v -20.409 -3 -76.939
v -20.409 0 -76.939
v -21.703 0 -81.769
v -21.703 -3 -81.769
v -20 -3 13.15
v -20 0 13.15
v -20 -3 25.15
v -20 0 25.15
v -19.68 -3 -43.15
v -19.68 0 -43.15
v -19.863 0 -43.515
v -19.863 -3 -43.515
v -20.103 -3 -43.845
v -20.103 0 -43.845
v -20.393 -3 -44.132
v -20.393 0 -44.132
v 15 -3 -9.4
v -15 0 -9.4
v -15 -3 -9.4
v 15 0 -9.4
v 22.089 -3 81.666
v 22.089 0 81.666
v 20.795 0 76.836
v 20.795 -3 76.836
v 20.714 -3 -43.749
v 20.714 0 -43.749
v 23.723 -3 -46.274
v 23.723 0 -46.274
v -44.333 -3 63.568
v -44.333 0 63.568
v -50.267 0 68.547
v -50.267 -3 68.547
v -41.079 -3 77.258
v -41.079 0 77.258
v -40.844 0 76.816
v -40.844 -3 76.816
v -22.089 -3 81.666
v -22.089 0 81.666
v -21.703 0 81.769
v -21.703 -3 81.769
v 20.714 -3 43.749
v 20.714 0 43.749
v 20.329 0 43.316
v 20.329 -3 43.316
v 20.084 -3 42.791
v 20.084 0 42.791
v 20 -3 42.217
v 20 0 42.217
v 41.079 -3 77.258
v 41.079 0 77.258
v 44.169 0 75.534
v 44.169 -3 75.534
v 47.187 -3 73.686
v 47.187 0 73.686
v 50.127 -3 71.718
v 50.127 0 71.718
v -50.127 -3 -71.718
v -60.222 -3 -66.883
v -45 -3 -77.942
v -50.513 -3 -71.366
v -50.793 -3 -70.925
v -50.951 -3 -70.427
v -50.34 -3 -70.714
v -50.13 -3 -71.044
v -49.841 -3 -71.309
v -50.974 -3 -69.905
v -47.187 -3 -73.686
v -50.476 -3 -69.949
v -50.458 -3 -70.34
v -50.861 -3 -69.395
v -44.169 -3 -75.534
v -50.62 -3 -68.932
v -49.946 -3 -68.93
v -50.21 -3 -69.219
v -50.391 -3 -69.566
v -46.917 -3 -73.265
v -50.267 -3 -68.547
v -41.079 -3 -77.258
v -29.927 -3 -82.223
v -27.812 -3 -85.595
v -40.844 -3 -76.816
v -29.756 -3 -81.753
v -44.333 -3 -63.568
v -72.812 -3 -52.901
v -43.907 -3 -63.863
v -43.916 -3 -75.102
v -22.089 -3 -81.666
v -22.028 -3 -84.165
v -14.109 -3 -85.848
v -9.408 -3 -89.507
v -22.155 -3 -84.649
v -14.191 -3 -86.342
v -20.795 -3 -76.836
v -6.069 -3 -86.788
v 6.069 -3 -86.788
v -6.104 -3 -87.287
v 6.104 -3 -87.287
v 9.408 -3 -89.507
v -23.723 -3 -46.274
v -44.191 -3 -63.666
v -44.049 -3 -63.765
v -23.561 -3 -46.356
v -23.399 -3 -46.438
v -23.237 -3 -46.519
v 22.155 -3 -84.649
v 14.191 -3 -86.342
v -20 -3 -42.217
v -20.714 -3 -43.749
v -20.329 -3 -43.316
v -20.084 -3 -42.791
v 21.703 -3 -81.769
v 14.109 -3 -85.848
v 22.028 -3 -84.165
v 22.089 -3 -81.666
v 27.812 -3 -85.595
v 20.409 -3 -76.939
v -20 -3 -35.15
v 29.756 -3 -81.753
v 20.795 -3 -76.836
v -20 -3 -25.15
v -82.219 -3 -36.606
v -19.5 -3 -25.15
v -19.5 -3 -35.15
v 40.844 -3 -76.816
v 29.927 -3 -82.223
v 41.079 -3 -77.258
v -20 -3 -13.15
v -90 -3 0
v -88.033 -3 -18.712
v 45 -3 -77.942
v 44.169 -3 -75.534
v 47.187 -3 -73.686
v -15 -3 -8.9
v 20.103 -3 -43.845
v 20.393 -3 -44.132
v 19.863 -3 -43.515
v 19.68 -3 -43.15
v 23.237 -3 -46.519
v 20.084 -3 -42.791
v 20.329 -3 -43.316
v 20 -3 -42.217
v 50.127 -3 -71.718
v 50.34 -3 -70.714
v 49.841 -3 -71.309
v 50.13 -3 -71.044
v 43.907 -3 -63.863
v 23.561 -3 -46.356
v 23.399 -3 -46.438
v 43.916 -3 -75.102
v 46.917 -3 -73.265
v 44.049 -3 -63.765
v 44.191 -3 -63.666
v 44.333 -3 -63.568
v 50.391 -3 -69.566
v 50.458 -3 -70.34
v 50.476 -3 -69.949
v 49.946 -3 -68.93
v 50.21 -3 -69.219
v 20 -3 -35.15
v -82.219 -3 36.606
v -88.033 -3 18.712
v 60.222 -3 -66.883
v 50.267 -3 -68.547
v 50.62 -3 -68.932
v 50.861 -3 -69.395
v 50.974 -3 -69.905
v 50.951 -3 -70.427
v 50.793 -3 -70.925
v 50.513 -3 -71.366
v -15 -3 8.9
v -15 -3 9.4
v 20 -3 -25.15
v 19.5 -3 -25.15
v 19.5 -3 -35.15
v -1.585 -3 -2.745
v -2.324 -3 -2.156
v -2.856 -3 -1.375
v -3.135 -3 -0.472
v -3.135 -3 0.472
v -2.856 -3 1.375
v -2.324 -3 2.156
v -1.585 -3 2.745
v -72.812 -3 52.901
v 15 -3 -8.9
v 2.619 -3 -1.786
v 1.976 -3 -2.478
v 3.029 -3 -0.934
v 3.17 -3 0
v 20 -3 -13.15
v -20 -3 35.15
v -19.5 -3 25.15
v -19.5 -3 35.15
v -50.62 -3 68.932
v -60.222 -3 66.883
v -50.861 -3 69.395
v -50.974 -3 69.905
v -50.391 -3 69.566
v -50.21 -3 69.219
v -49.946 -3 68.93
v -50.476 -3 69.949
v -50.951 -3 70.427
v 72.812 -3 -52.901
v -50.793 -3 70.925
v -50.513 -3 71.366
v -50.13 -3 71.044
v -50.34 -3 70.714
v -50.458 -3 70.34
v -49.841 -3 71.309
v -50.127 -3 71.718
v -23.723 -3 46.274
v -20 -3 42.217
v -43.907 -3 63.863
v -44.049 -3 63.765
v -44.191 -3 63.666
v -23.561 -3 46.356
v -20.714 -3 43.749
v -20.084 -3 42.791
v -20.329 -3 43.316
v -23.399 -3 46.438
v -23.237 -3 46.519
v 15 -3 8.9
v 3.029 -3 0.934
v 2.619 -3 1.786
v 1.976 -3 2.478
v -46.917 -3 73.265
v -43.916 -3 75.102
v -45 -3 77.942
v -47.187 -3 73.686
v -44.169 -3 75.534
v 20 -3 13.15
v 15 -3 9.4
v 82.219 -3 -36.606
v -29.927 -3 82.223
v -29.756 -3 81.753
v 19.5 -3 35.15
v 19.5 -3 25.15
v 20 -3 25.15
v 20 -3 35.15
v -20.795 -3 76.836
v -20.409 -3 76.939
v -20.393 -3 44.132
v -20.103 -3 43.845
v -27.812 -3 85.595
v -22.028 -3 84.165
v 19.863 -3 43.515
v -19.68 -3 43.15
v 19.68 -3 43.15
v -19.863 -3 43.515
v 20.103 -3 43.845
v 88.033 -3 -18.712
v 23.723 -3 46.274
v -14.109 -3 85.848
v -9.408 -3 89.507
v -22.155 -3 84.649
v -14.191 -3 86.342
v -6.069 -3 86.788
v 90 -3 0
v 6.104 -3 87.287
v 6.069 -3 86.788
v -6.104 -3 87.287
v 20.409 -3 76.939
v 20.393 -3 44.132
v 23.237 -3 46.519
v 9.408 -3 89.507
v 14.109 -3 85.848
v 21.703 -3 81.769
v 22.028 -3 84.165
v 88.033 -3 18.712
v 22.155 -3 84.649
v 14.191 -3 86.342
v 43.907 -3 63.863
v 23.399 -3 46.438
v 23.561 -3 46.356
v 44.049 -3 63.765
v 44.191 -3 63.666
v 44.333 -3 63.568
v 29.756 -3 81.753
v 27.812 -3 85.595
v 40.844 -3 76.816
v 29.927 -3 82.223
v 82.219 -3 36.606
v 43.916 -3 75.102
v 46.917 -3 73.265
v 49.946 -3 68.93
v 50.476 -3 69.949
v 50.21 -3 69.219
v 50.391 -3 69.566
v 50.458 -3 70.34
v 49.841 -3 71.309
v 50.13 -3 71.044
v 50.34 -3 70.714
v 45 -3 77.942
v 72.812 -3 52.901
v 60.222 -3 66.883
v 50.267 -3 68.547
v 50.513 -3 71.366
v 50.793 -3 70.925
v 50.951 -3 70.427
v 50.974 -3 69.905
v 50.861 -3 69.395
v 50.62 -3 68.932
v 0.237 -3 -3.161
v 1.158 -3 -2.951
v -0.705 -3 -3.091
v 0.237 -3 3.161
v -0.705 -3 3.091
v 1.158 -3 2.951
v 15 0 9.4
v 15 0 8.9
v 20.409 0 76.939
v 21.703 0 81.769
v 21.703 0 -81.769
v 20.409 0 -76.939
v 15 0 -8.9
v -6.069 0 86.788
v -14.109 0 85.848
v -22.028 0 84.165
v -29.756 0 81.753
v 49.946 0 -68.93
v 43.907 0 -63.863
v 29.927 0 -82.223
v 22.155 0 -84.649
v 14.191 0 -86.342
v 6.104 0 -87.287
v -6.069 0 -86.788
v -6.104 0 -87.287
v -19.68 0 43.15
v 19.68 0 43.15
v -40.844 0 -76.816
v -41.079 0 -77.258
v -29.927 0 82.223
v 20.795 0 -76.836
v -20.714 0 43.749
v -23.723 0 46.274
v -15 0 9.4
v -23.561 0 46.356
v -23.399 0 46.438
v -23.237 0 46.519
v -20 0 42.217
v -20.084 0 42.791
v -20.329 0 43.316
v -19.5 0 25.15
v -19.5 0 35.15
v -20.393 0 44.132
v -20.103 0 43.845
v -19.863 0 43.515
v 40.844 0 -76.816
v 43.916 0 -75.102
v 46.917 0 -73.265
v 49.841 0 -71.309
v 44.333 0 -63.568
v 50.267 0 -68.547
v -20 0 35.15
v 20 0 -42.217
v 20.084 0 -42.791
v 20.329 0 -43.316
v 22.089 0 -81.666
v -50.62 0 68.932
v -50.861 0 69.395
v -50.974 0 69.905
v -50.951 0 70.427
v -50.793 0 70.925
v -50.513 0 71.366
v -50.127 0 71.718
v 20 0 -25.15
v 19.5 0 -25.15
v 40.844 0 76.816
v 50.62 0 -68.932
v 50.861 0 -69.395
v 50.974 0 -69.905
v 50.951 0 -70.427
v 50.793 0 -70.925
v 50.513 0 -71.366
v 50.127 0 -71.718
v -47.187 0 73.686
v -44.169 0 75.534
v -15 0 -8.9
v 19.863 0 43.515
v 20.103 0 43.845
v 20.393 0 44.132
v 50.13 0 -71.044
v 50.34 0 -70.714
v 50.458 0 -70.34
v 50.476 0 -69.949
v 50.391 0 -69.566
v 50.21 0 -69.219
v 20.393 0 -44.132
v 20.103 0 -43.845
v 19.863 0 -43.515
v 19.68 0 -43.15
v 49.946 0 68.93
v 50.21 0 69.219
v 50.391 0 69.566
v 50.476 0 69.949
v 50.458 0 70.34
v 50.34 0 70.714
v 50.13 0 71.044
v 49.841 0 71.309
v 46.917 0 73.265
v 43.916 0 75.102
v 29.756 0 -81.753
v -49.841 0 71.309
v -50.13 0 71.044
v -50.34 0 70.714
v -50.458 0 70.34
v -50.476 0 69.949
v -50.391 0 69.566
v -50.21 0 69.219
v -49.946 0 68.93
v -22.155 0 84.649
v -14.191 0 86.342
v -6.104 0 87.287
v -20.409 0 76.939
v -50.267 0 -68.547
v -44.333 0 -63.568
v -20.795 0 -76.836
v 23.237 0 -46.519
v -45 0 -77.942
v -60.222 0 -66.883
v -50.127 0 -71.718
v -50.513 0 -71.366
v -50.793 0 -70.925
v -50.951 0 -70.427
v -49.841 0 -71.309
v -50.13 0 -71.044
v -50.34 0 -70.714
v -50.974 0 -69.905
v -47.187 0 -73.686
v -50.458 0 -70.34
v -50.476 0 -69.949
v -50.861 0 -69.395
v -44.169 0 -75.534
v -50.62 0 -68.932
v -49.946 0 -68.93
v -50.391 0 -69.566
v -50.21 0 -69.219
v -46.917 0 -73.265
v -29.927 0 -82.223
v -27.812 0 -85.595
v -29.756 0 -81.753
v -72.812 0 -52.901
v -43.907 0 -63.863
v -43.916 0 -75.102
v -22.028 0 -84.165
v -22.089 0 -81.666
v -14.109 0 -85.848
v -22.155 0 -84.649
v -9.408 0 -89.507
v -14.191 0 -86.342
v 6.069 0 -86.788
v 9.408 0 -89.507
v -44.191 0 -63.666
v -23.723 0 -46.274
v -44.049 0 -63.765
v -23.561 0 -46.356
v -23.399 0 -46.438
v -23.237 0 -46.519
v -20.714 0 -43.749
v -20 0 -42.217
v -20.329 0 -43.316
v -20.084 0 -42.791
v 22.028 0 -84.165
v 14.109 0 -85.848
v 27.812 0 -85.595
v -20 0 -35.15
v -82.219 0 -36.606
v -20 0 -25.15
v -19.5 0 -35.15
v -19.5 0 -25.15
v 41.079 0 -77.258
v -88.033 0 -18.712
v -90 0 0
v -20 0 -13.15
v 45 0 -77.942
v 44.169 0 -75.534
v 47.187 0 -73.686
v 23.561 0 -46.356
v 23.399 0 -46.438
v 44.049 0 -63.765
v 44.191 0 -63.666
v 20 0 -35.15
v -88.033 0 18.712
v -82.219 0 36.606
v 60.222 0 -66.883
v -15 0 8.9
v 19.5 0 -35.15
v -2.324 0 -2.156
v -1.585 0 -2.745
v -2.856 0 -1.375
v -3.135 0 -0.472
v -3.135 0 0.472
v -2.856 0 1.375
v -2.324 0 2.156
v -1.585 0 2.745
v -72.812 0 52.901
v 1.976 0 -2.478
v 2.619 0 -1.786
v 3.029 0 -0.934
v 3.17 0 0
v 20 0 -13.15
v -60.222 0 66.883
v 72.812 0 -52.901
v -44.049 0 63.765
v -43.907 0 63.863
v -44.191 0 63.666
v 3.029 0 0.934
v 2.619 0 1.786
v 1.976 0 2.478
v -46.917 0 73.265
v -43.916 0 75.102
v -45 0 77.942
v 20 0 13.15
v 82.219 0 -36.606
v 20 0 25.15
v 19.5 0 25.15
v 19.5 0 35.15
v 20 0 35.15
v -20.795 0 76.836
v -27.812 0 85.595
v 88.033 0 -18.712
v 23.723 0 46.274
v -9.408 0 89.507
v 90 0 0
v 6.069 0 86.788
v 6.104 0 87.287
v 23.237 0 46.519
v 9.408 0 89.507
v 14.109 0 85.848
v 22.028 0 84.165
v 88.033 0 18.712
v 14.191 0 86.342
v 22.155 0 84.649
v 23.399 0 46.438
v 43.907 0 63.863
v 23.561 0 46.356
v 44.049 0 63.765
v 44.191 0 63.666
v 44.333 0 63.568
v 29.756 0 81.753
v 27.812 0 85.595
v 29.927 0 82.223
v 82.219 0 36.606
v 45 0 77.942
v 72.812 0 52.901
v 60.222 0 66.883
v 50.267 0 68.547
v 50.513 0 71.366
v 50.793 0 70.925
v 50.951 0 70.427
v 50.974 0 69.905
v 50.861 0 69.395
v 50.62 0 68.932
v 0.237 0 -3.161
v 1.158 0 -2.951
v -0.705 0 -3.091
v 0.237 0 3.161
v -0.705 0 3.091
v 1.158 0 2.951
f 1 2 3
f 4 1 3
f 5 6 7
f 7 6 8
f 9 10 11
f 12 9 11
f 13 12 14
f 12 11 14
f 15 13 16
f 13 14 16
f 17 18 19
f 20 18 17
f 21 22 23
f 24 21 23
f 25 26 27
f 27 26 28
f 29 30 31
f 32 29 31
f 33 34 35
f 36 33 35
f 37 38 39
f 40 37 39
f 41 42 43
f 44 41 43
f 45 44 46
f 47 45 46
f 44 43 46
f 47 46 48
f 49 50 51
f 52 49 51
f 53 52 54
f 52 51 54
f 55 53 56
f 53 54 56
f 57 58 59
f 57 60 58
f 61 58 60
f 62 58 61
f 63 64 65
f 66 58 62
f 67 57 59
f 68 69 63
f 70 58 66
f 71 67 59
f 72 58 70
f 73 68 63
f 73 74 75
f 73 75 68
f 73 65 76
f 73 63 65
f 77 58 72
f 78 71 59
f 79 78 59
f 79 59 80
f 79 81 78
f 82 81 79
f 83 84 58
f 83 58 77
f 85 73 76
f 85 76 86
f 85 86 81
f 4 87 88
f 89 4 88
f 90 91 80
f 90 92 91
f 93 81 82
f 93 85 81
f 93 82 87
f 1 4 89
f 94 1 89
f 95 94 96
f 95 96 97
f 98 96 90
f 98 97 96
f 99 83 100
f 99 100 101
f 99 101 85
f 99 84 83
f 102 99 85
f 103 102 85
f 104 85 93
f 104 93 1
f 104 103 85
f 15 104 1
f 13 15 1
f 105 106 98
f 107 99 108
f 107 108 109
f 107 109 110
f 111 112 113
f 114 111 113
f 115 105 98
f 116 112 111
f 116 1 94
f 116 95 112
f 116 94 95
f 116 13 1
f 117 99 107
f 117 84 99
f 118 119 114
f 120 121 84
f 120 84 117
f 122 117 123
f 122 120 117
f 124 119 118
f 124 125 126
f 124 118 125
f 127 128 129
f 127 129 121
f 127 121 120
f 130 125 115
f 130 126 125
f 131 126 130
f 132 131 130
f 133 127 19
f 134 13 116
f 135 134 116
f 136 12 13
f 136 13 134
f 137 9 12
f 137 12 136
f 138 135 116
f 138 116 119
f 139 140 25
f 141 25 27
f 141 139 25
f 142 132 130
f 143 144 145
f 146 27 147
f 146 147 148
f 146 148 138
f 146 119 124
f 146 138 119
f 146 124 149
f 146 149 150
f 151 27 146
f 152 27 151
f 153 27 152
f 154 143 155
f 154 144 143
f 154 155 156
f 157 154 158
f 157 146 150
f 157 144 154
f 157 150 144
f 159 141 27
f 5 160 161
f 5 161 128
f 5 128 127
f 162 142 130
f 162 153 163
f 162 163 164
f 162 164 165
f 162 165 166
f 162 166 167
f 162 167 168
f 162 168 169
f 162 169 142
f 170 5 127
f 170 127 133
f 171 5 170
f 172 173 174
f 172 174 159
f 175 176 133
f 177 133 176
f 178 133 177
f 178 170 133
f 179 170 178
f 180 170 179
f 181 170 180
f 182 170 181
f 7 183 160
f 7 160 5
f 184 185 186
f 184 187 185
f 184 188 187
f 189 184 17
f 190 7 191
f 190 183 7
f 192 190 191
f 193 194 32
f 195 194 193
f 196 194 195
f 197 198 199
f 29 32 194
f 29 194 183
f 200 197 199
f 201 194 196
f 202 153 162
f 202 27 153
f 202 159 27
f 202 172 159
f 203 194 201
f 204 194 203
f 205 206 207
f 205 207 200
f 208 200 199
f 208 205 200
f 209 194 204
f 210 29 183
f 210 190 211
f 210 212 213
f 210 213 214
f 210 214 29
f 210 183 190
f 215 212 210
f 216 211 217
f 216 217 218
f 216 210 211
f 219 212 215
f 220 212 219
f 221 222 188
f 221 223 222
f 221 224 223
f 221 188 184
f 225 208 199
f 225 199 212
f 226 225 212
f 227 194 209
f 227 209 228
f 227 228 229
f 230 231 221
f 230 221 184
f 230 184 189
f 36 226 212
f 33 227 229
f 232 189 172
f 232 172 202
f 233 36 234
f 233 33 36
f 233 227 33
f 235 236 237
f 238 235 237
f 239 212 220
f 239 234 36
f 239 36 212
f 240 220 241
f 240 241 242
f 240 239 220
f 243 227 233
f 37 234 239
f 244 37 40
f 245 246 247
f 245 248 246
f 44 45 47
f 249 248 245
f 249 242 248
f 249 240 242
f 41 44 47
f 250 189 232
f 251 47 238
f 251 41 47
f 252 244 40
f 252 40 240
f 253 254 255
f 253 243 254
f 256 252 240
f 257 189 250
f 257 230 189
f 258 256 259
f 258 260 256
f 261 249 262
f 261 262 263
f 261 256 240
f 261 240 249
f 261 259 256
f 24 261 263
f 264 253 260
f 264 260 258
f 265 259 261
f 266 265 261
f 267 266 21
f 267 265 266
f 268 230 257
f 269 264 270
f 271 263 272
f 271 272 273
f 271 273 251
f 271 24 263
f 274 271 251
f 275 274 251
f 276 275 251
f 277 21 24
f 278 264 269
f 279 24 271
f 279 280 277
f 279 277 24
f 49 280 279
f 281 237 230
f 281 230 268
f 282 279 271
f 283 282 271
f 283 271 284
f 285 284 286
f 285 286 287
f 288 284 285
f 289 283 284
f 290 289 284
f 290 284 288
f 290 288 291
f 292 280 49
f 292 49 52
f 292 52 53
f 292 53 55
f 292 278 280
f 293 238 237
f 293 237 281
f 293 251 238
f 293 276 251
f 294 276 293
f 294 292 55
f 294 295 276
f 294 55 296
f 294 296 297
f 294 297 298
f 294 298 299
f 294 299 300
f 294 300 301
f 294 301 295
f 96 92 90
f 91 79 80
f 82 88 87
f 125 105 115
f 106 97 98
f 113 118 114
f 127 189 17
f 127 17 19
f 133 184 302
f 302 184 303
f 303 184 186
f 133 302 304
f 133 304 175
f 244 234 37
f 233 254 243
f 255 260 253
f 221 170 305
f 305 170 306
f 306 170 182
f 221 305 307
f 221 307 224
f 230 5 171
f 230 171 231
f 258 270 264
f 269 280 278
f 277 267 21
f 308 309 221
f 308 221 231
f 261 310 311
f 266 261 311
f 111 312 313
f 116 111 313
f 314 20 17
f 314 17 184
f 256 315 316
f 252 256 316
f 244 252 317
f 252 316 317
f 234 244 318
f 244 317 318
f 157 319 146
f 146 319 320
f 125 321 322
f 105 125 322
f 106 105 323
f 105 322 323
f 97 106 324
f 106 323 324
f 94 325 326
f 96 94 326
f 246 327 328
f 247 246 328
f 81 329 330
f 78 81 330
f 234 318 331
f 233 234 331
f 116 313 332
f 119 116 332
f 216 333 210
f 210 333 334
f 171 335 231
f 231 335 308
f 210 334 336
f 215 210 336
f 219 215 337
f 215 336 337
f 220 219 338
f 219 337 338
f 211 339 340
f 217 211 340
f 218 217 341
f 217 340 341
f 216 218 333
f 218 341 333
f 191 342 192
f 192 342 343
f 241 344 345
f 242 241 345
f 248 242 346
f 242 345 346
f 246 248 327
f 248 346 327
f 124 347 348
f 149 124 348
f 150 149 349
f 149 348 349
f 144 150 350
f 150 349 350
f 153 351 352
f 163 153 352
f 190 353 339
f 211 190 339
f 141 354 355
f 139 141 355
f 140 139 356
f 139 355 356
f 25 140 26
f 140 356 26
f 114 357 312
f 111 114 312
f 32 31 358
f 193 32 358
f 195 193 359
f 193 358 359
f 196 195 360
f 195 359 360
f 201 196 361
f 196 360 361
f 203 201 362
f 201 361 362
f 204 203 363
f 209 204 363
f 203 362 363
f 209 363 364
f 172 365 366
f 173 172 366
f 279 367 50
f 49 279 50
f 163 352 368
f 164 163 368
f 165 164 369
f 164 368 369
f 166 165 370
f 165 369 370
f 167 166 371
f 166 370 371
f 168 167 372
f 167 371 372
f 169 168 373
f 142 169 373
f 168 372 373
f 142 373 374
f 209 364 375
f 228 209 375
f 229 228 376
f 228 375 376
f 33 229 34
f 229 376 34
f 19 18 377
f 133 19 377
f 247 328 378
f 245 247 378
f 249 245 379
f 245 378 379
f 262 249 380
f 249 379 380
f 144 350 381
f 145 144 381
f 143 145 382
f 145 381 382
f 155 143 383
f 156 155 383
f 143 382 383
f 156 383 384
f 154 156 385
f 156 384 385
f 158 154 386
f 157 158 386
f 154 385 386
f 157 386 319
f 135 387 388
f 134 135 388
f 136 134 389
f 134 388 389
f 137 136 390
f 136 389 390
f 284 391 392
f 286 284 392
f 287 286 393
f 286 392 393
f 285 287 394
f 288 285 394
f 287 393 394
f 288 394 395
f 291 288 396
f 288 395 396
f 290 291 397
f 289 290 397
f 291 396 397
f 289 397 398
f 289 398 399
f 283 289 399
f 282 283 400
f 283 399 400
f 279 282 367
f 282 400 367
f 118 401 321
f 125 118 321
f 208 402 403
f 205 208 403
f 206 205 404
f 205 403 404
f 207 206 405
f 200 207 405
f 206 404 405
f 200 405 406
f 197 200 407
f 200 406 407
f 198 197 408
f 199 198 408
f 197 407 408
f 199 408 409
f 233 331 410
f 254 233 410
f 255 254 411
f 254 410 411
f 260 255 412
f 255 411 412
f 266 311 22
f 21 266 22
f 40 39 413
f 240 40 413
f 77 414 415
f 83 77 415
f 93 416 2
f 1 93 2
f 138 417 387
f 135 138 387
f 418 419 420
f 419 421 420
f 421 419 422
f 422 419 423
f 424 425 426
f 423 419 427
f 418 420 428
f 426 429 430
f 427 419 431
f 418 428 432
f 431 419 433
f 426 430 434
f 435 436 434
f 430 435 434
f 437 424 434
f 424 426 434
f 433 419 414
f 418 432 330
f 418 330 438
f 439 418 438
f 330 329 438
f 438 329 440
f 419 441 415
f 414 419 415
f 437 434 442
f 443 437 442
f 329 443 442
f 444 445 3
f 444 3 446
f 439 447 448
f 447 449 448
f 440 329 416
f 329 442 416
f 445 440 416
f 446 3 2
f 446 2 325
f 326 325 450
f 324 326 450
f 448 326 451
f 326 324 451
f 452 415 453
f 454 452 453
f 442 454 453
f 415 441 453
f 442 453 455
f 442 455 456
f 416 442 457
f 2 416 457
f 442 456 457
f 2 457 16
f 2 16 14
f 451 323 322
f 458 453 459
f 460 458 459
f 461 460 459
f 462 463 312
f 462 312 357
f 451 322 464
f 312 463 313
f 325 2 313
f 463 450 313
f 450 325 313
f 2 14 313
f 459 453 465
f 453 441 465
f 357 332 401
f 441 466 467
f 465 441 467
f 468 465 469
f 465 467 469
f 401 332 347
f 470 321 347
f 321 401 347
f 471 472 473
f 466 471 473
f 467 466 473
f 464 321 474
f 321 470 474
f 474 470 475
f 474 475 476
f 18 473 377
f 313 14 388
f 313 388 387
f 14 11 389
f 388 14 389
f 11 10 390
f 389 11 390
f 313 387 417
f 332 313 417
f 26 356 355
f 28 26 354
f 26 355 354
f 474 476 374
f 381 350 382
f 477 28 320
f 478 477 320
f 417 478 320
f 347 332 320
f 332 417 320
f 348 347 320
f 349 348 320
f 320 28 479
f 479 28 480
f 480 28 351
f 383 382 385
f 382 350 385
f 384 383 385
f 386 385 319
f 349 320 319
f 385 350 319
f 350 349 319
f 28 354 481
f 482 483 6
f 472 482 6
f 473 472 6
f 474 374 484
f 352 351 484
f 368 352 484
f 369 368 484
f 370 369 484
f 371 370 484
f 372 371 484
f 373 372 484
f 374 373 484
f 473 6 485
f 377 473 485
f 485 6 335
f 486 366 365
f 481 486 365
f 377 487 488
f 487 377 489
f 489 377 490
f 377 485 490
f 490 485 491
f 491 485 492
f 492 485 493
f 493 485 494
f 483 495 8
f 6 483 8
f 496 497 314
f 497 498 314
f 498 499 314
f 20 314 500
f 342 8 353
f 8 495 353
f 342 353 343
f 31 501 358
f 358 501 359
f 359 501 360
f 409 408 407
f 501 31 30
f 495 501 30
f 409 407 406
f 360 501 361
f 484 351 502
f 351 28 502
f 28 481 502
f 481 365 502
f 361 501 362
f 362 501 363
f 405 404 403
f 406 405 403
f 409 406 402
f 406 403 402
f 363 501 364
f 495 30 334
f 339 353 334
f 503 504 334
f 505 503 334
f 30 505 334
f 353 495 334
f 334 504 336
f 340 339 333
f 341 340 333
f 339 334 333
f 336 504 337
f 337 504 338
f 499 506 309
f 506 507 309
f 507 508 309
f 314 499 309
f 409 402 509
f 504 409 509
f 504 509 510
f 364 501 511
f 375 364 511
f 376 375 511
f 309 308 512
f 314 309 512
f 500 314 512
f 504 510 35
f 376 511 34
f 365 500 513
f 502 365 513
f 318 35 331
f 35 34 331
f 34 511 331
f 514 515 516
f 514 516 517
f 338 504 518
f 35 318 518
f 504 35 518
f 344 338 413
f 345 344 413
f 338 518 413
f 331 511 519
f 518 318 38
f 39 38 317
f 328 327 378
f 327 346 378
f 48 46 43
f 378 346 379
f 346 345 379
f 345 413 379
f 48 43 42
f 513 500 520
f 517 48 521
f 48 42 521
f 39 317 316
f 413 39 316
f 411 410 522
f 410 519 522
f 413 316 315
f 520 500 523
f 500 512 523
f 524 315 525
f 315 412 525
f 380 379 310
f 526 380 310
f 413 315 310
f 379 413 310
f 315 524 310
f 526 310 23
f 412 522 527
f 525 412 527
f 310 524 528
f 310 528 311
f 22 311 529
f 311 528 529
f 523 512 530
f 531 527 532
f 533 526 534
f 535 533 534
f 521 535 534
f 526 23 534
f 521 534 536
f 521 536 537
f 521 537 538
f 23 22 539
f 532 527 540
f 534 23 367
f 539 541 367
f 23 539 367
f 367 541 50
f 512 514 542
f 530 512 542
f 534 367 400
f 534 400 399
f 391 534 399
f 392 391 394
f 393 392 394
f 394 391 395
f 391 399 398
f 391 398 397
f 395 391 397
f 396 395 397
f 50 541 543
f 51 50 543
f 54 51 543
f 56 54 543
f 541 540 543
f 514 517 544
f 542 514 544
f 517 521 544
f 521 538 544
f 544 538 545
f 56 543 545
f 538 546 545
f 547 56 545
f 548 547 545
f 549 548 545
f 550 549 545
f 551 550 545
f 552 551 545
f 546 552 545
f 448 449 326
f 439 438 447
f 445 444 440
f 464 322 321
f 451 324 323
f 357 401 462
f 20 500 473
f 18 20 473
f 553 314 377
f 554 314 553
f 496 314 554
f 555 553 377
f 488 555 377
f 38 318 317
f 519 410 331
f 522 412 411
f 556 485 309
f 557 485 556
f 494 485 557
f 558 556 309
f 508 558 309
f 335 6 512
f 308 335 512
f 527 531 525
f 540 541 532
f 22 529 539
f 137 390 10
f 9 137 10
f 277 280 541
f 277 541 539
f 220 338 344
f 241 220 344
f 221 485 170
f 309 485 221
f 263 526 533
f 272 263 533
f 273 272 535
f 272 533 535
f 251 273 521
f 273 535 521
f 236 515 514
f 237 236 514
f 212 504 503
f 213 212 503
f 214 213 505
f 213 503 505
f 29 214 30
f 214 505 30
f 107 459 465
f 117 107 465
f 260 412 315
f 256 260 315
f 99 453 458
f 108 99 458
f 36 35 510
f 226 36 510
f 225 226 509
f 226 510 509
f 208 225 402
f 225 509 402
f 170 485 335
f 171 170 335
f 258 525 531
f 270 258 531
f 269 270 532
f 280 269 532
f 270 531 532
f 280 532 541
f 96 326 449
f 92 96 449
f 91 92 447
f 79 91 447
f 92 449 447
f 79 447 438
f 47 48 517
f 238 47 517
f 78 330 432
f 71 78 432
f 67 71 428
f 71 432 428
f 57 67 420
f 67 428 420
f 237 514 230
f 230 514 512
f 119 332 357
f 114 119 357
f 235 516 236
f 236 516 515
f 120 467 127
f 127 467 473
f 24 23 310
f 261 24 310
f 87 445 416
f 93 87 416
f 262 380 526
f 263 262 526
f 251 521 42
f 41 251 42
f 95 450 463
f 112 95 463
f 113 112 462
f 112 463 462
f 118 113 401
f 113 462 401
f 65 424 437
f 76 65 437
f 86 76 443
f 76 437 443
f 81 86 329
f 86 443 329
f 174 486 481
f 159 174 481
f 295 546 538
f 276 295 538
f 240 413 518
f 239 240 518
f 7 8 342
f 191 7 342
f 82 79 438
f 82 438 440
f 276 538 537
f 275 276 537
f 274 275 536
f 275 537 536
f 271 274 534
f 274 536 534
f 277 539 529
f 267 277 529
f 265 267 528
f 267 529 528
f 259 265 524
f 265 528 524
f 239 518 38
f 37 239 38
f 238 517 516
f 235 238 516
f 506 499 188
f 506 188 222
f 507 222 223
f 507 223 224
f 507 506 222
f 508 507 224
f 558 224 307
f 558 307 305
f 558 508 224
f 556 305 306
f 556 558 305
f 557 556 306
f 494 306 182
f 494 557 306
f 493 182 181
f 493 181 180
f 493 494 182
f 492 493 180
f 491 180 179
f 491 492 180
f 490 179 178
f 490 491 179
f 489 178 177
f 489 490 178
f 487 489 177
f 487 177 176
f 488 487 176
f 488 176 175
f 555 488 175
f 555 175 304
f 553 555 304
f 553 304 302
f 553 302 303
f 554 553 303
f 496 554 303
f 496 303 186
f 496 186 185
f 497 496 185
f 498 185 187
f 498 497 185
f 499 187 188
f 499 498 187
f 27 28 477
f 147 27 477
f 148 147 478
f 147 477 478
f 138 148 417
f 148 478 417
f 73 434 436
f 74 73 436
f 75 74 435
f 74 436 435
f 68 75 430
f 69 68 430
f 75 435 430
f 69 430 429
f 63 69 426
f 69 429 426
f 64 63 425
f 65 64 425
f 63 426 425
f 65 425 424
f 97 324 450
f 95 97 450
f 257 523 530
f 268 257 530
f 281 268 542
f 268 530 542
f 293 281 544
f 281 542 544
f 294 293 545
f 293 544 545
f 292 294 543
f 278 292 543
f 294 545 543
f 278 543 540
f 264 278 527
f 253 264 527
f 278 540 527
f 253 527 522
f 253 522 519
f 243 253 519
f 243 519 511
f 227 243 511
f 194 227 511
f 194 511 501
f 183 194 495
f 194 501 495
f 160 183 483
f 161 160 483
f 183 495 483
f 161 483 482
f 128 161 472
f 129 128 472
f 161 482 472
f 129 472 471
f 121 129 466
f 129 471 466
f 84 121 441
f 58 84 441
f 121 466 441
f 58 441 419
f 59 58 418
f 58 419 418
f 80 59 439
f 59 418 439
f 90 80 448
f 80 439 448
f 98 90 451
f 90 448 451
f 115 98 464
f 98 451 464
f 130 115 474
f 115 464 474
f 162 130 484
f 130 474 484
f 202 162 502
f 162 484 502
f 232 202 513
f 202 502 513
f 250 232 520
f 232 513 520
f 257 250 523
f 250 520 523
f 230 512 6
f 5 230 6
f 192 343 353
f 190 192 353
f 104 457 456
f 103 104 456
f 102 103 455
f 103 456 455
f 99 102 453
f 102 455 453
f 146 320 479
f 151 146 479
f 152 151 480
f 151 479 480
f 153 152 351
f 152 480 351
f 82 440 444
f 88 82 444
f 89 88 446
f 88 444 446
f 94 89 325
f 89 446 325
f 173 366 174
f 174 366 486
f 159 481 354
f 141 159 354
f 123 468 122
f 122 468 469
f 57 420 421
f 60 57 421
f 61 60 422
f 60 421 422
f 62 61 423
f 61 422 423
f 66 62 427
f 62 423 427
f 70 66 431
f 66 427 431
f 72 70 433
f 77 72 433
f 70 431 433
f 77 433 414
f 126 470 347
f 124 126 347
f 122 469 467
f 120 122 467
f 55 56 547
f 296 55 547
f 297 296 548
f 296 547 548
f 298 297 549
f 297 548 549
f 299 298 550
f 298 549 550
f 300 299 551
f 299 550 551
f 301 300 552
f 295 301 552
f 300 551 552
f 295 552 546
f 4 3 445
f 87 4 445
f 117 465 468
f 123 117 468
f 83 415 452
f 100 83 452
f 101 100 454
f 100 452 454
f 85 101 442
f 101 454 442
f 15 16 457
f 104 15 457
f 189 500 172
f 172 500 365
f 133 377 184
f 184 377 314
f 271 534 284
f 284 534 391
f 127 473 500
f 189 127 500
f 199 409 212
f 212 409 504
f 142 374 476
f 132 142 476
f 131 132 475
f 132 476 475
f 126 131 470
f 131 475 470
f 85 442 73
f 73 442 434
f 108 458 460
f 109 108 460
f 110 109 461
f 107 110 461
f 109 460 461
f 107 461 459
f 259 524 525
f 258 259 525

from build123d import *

# Parameters (mm, degrees)
F0_R     = 90
F0_W     = 30
F0_H     = 0.5
F0_R_2   = 3.17
F1_DEPTH = 3


with BuildPart() as f1:
    # F0 (on Front) → F1 (new body)
    with BuildSketch(Plane.XZ):
        Circle(F0_R)
        with BuildLine():
            ThreePointArc((-41.078762, -77.257914), (-45.686982, -74.625396), (-50.127129, -71.718345))
            ThreePointArc((-50.127129, -71.718345), (-50.979425, -70.167154), (-50.266941, -68.546979))
            Line((-50.266941, -68.546979), (-44.332839, -63.567676))
            ThreePointArc((-44.332839, -63.567676), (-44.12, -63.715584), (-43.906667, -63.862779))
            Line((-43.906667, -63.862779), (-49.945547, -68.930001))
            ThreePointArc((-49.945547, -68.930001), (-50.47991, -70.145133), (-49.840688, -71.308525))
            ThreePointArc((-49.840688, -71.308525), (-45.425914, -74.198965), (-40.844026, -76.816441))
            Line((-40.844026, -76.816441), (-41.078762, -77.257914))
        make_face(mode=Mode.SUBTRACT)
        with BuildLine():
            Line((-29.926763, -82.223104), (-29.755752, -81.753258))
            ThreePointArc((-29.755752, -81.753258), (-18.088317, -85.098841), (-6.068813, -86.788072))
            Line((-6.068813, -86.788072), (-6.103691, -87.286854))
            ThreePointArc((-6.103691, -87.286854), (-18.192273, -85.587915), (-29.926763, -82.223104))
        make_face(mode=Mode.SUBTRACT)
        Polygon((-20.795181, -76.835932), (-20.408811, -76.93946), (-21.702906, -81.769089), (-22.089276, -81.665561), align=None, mode=Mode.SUBTRACT)
        with BuildLine():
            Line((6.103691, -87.286854), (6.068813, -86.788072))
            ThreePointArc((6.068813, -86.788072), (18.088317, -85.098841), (29.755752, -81.753258))
            Line((29.755752, -81.753258), (29.926763, -82.223104))
            ThreePointArc((29.926763, -82.223104), (18.192273, -85.587915), (6.103691, -87.286854))
        make_face(mode=Mode.SUBTRACT)
        Polygon((22.089276, -81.665561), (21.702906, -81.769089), (20.408811, -76.93946), (20.795181, -76.835932), align=None, mode=Mode.SUBTRACT)
        with BuildLine():
            ThreePointArc((50.266941, -68.546979), (50.979425, -70.167154), (50.127129, -71.718345))
            ThreePointArc((50.127129, -71.718345), (45.686982, -74.625396), (41.078762, -77.257914))
            Line((41.078762, -77.257914), (40.844026, -76.816441))
            ThreePointArc((40.844026, -76.816441), (45.425914, -74.198965), (49.840688, -71.308525))
            ThreePointArc((49.840688, -71.308525), (50.47991, -70.145133), (49.945547, -68.930001))
            Line((49.945547, -68.930001), (43.906667, -63.862779))
            ThreePointArc((43.906667, -63.862779), (44.12, -63.715584), (44.332839, -63.567676))
            Line((44.332839, -63.567676), (50.266941, -68.546979))
        make_face(mode=Mode.SUBTRACT)
        with BuildLine():
            Line((-23.722514, -46.27356), (-20.714425, -43.749474))
            ThreePointArc((-20.714425, -43.749474), (-20.187384, -43.062621), (-20, -42.217385))
            Line((-20, -42.217385), (-20, -35.15))
            Line((-20, -35.15), (-19.5, -35.15))
            Line((-19.5, -35.15), (-19.5, -25.15))
            Line((-19.5, -25.15), (-20, -25.15))
            Line((-20, -25.15), (-20, -15.15))
            Line((-20, -15.15), (-20, -13.15))
            Line((-20, -13.15), (-18, -13.15))
            Line((-18, -13.15), (-7.5, -13.15))
            Line((-7.5, -13.15), (7.5, -13.15))
            Line((7.5, -13.15), (18, -13.15))
            Line((18, -13.15), (20, -13.15))
            Line((20, -13.15), (20, -15.15))
            Line((20, -15.15), (20, -25.15))
            Line((20, -25.15), (19.5, -25.15))
            Line((19.5, -25.15), (19.5, -35.15))
            Line((19.5, -35.15), (20, -35.15))
            Line((20, -35.15), (20, -42.217385))
            ThreePointArc((20, -42.217385), (20.187384, -43.062621), (20.714425, -43.749474))
            Line((20.714425, -43.749474), (23.722514, -46.27356))
            ThreePointArc((23.722514, -46.27356), (23.480225, -46.396972), (23.237294, -46.519116))
            Line((23.237294, -46.519116), (20.393031, -44.132496))
            ThreePointArc((20.393031, -44.132496), (19.976222, -43.685146), (19.680468, -43.15))
            Line((19.680468, -43.15), (-19.680468, -43.15))
            ThreePointArc((-19.680468, -43.15), (-19.976222, -43.685146), (-20.393031, -44.132496))
            Line((-20.393031, -44.132496), (-23.237294, -46.519116))
            ThreePointArc((-23.237294, -46.519116), (-23.480225, -46.396972), (-23.722514, -46.27356))
        make_face(mode=Mode.SUBTRACT)
        with Locations((0, -9.15)):
            Rectangle(F0_W, F0_H, mode=Mode.SUBTRACT)
        with BuildLine():
            Line((-49.945547, 68.930001), (-43.906667, 63.862779))
            ThreePointArc((-43.906667, 63.862779), (-44.12, 63.715584), (-44.332839, 63.567676))
            Line((-44.332839, 63.567676), (-50.266941, 68.546979))
            ThreePointArc((-50.266941, 68.546979), (-50.979425, 70.167154), (-50.127129, 71.718345))
            ThreePointArc((-50.127129, 71.718345), (-45.686982, 74.625396), (-41.078762, 77.257914))
            Line((-41.078762, 77.257914), (-40.844026, 76.816441))
            ThreePointArc((-40.844026, 76.816441), (-45.425914, 74.198965), (-49.840688, 71.308525))
            ThreePointArc((-49.840688, 71.308525), (-50.47991, 70.145133), (-49.945547, 68.930001))
        make_face(mode=Mode.SUBTRACT)
        Polygon((-22.089276, 81.665561), (-21.702906, 81.769089), (-20.408811, 76.93946), (-20.795181, 76.835932), align=None, mode=Mode.SUBTRACT)
        with BuildLine():
            ThreePointArc((-6.068813, 86.788072), (-18.088317, 85.098841), (-29.755752, 81.753258))
            Line((-29.755752, 81.753258), (-29.926763, 82.223104))
            ThreePointArc((-29.926763, 82.223104), (-18.192273, 85.587915), (-6.103691, 87.286854))
            Line((-6.103691, 87.286854), (-6.068813, 86.788072))
        make_face(mode=Mode.SUBTRACT)
        Circle(F0_R_2, mode=Mode.SUBTRACT)
        with Locations((0, 9.15)):
            Rectangle(F0_W, F0_H, mode=Mode.SUBTRACT)
        with BuildLine():
            ThreePointArc((19.680468, 43.15), (19.976222, 43.685146), (20.393031, 44.132496))
            Line((20.393031, 44.132496), (23.237294, 46.519116))
            ThreePointArc((23.237294, 46.519116), (23.480225, 46.396972), (23.722514, 46.27356))
            Line((23.722514, 46.27356), (20.714425, 43.749474))
            ThreePointArc((20.714425, 43.749474), (20.187384, 43.062621), (20, 42.217385))
            Line((20, 42.217385), (20, 35.15))
            Line((20, 35.15), (19.5, 35.15))
            Line((19.5, 35.15), (19.5, 25.15))
            Line((19.5, 25.15), (20, 25.15))
            Line((20, 25.15), (20, 15.15))
            Line((20, 15.15), (20, 13.15))
            Line((20, 13.15), (18, 13.15))
            Line((18, 13.15), (7.5, 13.15))
            Line((7.5, 13.15), (-7.5, 13.15))
            Line((-7.5, 13.15), (-18, 13.15))
            Line((-18, 13.15), (-20, 13.15))
            Line((-20, 13.15), (-20, 15.15))
            Line((-20, 15.15), (-20, 25.15))
            Line((-20, 25.15), (-19.5, 25.15))
            Line((-19.5, 25.15), (-19.5, 35.15))
            Line((-19.5, 35.15), (-20, 35.15))
            Line((-20, 35.15), (-20, 42.217385))
            ThreePointArc((-20, 42.217385), (-20.187384, 43.062621), (-20.714425, 43.749474))
            Line((-20.714425, 43.749474), (-23.722514, 46.27356))
            ThreePointArc((-23.722514, 46.27356), (-23.480225, 46.396972), (-23.237294, 46.519116))
            Line((-23.237294, 46.519116), (-20.393031, 44.132496))
            ThreePointArc((-20.393031, 44.132496), (-19.976222, 43.685146), (-19.680468, 43.15))
            Line((-19.680468, 43.15), (19.680468, 43.15))
        make_face(mode=Mode.SUBTRACT)
        Polygon((20.795181, 76.835932), (20.408811, 76.93946), (21.702906, 81.769089), (22.089276, 81.665561), align=None, mode=Mode.SUBTRACT)
        with BuildLine():
            Line((29.926763, 82.223104), (29.755752, 81.753258))
            ThreePointArc((29.755752, 81.753258), (18.088317, 85.098841), (6.068813, 86.788072))
            Line((6.068813, 86.788072), (6.103691, 87.286854))
            ThreePointArc((6.103691, 87.286854), (18.192273, 85.587915), (29.926763, 82.223104))
        make_face(mode=Mode.SUBTRACT)
        with BuildLine():
            ThreePointArc((44.332839, 63.567676), (44.12, 63.715584), (43.906667, 63.862779))
            Line((43.906667, 63.862779), (49.945547, 68.930001))
            ThreePointArc((49.945547, 68.930001), (50.47991, 70.145133), (49.840688, 71.308525))
            ThreePointArc((49.840688, 71.308525), (45.425914, 74.198965), (40.844026, 76.816441))
            Line((40.844026, 76.816441), (41.078762, 77.257914))
            ThreePointArc((41.078762, 77.257914), (45.686982, 74.625396), (50.127129, 71.718345))
            ThreePointArc((50.127129, 71.718345), (50.979425, 70.167154), (50.266941, 68.546979))
            Line((50.266941, 68.546979), (44.332839, 63.567676))
        make_face(mode=Mode.SUBTRACT)
    extrude(amount=F1_DEPTH)


solid = f1.part
